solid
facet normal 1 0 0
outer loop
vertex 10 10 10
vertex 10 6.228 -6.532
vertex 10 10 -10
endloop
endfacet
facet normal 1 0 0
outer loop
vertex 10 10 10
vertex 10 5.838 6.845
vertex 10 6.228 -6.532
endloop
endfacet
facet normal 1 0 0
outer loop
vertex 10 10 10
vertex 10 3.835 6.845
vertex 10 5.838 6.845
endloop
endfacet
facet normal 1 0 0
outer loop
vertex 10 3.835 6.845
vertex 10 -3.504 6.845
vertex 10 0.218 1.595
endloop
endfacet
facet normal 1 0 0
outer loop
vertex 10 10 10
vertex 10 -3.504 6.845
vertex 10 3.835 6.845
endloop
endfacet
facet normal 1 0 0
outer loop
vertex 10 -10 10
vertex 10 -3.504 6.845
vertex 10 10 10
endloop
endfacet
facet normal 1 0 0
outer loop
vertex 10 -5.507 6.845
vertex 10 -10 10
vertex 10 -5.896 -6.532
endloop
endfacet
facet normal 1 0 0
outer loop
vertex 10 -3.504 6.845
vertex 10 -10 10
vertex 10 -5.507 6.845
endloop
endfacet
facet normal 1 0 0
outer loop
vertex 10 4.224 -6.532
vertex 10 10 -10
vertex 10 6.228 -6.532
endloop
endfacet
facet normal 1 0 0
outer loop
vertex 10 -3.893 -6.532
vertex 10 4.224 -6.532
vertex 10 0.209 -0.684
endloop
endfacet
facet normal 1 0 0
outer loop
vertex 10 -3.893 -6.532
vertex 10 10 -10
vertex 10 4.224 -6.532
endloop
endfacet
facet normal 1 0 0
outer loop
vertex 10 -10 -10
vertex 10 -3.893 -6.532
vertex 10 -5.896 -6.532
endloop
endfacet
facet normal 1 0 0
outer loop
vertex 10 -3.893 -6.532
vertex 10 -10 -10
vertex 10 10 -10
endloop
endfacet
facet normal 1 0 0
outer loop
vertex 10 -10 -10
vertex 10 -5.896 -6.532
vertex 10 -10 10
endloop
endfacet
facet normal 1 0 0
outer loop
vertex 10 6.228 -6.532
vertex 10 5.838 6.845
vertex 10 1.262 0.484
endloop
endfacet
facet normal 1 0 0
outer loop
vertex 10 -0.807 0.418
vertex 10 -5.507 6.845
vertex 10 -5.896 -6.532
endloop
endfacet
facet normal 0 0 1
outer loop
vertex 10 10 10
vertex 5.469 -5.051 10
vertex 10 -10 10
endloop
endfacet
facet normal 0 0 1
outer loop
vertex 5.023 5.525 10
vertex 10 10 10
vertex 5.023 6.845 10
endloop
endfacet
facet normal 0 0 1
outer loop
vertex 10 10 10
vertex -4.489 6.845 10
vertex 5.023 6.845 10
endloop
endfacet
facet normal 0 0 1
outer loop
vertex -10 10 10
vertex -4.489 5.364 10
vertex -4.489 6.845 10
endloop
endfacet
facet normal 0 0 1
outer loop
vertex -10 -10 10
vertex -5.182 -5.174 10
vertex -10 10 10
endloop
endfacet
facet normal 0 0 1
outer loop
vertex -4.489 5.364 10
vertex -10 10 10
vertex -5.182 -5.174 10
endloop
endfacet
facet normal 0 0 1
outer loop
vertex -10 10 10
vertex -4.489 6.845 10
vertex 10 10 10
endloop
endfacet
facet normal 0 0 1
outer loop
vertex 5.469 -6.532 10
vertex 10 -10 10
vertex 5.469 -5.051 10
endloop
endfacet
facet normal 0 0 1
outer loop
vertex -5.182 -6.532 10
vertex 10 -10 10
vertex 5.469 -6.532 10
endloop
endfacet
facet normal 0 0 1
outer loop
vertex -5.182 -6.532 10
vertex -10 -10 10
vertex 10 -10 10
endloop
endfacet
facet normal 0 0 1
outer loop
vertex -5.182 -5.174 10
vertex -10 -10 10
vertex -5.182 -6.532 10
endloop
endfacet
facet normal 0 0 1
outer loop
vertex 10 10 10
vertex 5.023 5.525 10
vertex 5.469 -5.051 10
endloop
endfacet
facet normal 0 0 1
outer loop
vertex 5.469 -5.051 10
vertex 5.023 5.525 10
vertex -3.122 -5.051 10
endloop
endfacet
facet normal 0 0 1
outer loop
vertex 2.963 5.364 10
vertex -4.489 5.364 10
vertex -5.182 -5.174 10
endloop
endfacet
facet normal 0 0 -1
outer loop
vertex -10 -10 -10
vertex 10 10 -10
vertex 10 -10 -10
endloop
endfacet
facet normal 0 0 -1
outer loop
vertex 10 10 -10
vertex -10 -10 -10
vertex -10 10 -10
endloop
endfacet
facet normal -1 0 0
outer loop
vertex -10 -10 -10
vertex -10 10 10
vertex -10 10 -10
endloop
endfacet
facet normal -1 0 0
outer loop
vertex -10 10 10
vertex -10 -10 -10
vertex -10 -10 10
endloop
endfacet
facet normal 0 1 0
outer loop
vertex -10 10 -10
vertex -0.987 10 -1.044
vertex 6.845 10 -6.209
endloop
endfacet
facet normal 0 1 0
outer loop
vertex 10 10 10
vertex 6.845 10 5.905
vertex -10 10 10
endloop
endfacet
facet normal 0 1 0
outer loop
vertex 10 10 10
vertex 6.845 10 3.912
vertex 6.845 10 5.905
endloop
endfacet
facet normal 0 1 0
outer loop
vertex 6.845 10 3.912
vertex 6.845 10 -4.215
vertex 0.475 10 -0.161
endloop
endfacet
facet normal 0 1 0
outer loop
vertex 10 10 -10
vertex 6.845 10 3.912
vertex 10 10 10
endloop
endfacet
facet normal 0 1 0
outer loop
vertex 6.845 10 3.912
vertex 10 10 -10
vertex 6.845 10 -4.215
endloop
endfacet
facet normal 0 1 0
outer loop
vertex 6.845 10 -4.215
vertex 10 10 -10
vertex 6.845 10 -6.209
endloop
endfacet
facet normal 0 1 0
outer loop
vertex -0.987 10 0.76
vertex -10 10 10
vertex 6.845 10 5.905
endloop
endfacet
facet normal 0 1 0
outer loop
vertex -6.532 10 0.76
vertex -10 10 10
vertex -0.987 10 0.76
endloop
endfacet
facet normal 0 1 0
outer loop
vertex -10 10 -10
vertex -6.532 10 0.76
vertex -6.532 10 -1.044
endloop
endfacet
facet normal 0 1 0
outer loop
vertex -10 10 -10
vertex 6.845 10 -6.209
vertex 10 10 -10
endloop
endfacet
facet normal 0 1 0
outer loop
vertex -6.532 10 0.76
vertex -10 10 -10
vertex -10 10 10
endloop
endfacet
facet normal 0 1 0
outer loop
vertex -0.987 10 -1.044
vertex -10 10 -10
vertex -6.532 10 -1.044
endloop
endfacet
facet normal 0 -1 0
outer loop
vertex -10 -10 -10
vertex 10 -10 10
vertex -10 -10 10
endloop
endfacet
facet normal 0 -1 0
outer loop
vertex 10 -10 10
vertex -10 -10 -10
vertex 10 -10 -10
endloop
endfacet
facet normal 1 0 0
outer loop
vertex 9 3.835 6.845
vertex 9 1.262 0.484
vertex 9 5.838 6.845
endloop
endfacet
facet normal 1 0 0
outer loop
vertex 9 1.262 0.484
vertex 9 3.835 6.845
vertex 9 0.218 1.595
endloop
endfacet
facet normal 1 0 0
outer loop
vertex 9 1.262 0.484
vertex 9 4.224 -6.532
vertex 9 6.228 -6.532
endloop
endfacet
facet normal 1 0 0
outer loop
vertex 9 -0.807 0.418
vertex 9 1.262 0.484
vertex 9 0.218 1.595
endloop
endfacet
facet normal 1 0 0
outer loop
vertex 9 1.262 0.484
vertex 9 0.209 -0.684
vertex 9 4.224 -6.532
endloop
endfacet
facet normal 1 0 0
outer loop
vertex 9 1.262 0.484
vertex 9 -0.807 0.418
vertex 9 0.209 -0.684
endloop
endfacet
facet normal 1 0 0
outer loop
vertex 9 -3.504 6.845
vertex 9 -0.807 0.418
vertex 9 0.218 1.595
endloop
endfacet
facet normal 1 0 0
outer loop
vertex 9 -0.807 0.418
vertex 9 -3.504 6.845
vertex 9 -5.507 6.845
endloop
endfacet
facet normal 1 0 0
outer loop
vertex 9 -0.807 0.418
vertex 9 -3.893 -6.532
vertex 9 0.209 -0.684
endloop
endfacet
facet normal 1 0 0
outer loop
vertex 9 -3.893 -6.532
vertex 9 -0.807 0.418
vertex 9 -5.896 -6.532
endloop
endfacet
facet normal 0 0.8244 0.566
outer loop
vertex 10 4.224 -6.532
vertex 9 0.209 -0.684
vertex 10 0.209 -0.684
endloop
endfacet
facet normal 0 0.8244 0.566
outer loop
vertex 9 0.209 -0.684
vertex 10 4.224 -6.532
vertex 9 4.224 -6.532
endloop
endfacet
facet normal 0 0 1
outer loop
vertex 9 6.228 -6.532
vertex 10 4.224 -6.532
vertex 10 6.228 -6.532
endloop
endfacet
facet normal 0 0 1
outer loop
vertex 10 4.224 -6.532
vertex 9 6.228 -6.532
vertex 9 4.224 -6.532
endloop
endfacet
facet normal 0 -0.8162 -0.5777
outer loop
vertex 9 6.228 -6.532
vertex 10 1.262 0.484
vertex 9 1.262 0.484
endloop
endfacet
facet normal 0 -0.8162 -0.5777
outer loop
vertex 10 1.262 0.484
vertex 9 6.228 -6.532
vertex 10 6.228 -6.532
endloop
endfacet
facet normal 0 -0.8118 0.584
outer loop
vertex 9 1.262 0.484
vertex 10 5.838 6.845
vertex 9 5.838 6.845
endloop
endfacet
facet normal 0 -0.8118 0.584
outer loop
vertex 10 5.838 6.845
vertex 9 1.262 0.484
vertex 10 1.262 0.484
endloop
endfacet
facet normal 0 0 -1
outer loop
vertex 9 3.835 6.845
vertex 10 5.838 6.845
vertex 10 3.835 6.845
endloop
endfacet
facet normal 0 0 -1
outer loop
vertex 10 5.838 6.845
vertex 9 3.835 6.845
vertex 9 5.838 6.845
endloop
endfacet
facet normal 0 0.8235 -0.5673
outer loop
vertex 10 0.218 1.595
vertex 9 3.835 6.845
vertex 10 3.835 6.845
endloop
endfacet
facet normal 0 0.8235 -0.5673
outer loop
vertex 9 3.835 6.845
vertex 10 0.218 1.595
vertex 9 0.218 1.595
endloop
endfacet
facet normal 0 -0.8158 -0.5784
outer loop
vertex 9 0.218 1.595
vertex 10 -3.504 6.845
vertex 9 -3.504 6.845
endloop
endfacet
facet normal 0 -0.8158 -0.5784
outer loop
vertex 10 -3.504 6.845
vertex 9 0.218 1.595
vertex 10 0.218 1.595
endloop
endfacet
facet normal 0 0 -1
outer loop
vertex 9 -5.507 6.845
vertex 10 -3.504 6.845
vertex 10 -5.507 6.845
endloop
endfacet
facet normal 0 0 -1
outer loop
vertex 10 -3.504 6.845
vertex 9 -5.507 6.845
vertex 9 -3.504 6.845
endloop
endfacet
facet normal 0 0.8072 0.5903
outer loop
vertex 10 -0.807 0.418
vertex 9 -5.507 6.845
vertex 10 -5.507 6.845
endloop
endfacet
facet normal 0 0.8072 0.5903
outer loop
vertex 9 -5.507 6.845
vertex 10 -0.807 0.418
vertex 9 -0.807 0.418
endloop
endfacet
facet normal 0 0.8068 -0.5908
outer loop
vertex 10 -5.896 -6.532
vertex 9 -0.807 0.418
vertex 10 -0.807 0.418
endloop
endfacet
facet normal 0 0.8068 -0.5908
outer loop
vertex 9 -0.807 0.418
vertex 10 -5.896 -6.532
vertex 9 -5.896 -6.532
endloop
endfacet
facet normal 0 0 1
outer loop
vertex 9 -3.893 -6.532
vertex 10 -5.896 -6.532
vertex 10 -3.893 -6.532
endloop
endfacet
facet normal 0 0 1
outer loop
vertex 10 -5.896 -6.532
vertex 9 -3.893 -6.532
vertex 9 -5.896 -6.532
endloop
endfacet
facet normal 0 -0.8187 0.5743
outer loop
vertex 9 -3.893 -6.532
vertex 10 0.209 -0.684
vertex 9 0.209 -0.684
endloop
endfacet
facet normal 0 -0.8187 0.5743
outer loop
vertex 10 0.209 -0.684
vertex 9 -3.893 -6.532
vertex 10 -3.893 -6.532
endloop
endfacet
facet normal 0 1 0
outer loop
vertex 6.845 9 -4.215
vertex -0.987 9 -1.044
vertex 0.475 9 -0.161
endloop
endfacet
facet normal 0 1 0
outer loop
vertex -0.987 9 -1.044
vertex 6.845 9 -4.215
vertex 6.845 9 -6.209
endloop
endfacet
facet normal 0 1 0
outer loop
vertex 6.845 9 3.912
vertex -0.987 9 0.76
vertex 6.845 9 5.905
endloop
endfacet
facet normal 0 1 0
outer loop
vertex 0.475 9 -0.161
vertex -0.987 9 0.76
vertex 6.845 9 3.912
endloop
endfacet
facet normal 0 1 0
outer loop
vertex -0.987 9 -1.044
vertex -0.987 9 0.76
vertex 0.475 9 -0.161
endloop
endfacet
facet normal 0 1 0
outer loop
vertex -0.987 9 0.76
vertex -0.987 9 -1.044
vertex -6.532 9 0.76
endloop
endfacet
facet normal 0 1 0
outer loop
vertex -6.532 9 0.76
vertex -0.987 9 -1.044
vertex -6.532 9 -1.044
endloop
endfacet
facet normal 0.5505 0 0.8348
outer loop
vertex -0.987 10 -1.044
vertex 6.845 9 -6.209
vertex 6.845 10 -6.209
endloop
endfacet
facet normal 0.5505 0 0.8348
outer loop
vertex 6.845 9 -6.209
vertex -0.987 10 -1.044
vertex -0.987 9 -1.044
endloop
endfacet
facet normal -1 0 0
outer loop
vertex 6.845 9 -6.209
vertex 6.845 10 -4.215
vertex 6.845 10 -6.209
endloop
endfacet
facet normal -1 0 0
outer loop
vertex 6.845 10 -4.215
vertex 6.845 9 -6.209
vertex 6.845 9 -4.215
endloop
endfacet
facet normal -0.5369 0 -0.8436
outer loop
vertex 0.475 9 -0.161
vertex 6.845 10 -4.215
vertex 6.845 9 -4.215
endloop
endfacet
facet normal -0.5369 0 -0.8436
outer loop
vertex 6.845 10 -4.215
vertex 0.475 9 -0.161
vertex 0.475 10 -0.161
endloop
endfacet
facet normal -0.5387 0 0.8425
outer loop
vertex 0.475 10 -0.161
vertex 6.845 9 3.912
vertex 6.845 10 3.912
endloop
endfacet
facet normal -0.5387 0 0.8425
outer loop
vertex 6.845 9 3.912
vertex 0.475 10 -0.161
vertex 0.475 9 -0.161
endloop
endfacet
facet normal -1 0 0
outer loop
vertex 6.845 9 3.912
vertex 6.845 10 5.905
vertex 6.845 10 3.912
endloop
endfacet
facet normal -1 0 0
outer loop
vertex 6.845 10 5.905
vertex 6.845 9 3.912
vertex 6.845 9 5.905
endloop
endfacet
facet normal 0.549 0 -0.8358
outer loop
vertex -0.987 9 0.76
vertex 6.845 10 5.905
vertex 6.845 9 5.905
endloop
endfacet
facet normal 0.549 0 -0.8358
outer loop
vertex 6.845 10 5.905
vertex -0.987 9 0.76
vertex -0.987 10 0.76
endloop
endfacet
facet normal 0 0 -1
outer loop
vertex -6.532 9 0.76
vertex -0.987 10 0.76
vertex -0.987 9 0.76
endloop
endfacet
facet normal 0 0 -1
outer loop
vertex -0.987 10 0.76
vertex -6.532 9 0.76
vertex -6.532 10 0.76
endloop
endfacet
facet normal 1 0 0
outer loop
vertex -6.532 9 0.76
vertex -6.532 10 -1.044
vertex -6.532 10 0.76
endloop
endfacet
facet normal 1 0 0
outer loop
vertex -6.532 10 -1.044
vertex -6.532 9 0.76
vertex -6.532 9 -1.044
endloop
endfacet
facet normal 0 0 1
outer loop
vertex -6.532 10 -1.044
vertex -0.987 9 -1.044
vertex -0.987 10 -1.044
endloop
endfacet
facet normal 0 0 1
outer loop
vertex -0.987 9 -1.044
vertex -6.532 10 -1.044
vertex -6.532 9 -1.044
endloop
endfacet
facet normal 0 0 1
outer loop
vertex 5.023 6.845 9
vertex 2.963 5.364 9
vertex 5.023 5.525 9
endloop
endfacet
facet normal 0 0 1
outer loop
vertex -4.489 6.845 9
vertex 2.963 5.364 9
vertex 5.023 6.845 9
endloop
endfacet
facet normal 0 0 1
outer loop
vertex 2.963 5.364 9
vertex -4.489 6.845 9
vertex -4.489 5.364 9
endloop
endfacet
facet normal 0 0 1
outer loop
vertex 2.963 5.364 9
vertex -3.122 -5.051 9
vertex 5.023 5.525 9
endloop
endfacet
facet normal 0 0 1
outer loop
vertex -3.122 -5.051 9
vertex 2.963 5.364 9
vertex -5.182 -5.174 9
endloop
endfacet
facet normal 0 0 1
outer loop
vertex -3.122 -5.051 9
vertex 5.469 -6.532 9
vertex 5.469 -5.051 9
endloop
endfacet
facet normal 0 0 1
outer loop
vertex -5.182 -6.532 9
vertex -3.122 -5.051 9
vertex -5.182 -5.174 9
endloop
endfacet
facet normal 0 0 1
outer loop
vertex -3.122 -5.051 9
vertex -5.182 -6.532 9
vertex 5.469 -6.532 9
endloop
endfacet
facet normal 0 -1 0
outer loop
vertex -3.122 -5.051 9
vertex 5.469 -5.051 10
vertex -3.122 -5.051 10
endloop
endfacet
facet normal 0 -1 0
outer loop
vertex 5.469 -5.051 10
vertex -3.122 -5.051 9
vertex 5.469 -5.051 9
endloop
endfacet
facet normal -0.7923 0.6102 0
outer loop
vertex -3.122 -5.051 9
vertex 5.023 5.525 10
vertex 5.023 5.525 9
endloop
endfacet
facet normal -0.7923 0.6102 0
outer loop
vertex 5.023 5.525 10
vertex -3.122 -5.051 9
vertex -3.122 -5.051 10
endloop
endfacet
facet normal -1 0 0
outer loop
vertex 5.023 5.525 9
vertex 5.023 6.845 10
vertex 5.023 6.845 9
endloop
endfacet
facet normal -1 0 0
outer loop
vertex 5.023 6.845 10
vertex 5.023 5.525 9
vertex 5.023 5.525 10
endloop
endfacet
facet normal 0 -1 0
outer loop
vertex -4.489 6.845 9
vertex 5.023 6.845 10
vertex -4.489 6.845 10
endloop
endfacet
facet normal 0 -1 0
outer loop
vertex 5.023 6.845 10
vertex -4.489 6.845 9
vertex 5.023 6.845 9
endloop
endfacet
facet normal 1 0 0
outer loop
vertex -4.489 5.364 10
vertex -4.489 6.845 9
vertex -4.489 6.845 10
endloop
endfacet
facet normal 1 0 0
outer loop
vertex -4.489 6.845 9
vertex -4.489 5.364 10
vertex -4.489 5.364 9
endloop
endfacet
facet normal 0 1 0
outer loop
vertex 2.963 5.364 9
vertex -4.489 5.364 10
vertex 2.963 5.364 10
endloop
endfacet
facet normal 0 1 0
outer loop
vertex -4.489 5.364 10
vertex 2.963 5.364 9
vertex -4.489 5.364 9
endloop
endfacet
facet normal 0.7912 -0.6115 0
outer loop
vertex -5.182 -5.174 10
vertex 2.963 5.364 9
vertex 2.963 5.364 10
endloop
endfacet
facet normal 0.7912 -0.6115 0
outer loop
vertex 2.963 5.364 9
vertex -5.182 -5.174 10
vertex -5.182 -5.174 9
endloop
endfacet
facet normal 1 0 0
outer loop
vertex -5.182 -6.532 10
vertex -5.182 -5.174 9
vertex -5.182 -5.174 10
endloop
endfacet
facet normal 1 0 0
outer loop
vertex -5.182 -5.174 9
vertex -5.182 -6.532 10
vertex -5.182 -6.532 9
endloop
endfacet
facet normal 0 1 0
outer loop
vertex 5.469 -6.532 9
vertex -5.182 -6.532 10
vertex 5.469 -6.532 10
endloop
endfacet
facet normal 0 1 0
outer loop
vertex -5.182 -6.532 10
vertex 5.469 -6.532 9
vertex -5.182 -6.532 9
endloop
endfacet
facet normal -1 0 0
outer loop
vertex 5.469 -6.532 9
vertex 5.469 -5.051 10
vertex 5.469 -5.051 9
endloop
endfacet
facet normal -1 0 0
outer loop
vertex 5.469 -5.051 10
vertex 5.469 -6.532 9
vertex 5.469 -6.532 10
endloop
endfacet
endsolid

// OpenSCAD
// cube side length
side=20;
// font size percentage
ptext=side*0.7;
// letters depth
depth=1;

cube_xyz(side,ptext,depth);

module cube_xyz(i_side,i_ptext,i_depth) {
	insurance=0.1;
	
	difference() {
		cube(i_side,true);
		
		translate([(i_side/2)-i_depth,0,0])
            rotate(a=[90,0,90])
                linear_extrude(i_depth+insurance)
                    text("X",size=i_ptext,halign="center",valign="center");
		
		translate([0,((i_side/2)+insurance),0])
            rotate(a=[90,90,0])
                linear_extrude(i_depth+insurance)
                    text("Y",size=i_ptext,halign="center",valign="center");
		
		translate([0,0,(i_side/2)-i_depth])
            linear_extrude(i_depth+insurance)
                text("Z",size=i_ptext,halign="center",valign="center");
	}
}
